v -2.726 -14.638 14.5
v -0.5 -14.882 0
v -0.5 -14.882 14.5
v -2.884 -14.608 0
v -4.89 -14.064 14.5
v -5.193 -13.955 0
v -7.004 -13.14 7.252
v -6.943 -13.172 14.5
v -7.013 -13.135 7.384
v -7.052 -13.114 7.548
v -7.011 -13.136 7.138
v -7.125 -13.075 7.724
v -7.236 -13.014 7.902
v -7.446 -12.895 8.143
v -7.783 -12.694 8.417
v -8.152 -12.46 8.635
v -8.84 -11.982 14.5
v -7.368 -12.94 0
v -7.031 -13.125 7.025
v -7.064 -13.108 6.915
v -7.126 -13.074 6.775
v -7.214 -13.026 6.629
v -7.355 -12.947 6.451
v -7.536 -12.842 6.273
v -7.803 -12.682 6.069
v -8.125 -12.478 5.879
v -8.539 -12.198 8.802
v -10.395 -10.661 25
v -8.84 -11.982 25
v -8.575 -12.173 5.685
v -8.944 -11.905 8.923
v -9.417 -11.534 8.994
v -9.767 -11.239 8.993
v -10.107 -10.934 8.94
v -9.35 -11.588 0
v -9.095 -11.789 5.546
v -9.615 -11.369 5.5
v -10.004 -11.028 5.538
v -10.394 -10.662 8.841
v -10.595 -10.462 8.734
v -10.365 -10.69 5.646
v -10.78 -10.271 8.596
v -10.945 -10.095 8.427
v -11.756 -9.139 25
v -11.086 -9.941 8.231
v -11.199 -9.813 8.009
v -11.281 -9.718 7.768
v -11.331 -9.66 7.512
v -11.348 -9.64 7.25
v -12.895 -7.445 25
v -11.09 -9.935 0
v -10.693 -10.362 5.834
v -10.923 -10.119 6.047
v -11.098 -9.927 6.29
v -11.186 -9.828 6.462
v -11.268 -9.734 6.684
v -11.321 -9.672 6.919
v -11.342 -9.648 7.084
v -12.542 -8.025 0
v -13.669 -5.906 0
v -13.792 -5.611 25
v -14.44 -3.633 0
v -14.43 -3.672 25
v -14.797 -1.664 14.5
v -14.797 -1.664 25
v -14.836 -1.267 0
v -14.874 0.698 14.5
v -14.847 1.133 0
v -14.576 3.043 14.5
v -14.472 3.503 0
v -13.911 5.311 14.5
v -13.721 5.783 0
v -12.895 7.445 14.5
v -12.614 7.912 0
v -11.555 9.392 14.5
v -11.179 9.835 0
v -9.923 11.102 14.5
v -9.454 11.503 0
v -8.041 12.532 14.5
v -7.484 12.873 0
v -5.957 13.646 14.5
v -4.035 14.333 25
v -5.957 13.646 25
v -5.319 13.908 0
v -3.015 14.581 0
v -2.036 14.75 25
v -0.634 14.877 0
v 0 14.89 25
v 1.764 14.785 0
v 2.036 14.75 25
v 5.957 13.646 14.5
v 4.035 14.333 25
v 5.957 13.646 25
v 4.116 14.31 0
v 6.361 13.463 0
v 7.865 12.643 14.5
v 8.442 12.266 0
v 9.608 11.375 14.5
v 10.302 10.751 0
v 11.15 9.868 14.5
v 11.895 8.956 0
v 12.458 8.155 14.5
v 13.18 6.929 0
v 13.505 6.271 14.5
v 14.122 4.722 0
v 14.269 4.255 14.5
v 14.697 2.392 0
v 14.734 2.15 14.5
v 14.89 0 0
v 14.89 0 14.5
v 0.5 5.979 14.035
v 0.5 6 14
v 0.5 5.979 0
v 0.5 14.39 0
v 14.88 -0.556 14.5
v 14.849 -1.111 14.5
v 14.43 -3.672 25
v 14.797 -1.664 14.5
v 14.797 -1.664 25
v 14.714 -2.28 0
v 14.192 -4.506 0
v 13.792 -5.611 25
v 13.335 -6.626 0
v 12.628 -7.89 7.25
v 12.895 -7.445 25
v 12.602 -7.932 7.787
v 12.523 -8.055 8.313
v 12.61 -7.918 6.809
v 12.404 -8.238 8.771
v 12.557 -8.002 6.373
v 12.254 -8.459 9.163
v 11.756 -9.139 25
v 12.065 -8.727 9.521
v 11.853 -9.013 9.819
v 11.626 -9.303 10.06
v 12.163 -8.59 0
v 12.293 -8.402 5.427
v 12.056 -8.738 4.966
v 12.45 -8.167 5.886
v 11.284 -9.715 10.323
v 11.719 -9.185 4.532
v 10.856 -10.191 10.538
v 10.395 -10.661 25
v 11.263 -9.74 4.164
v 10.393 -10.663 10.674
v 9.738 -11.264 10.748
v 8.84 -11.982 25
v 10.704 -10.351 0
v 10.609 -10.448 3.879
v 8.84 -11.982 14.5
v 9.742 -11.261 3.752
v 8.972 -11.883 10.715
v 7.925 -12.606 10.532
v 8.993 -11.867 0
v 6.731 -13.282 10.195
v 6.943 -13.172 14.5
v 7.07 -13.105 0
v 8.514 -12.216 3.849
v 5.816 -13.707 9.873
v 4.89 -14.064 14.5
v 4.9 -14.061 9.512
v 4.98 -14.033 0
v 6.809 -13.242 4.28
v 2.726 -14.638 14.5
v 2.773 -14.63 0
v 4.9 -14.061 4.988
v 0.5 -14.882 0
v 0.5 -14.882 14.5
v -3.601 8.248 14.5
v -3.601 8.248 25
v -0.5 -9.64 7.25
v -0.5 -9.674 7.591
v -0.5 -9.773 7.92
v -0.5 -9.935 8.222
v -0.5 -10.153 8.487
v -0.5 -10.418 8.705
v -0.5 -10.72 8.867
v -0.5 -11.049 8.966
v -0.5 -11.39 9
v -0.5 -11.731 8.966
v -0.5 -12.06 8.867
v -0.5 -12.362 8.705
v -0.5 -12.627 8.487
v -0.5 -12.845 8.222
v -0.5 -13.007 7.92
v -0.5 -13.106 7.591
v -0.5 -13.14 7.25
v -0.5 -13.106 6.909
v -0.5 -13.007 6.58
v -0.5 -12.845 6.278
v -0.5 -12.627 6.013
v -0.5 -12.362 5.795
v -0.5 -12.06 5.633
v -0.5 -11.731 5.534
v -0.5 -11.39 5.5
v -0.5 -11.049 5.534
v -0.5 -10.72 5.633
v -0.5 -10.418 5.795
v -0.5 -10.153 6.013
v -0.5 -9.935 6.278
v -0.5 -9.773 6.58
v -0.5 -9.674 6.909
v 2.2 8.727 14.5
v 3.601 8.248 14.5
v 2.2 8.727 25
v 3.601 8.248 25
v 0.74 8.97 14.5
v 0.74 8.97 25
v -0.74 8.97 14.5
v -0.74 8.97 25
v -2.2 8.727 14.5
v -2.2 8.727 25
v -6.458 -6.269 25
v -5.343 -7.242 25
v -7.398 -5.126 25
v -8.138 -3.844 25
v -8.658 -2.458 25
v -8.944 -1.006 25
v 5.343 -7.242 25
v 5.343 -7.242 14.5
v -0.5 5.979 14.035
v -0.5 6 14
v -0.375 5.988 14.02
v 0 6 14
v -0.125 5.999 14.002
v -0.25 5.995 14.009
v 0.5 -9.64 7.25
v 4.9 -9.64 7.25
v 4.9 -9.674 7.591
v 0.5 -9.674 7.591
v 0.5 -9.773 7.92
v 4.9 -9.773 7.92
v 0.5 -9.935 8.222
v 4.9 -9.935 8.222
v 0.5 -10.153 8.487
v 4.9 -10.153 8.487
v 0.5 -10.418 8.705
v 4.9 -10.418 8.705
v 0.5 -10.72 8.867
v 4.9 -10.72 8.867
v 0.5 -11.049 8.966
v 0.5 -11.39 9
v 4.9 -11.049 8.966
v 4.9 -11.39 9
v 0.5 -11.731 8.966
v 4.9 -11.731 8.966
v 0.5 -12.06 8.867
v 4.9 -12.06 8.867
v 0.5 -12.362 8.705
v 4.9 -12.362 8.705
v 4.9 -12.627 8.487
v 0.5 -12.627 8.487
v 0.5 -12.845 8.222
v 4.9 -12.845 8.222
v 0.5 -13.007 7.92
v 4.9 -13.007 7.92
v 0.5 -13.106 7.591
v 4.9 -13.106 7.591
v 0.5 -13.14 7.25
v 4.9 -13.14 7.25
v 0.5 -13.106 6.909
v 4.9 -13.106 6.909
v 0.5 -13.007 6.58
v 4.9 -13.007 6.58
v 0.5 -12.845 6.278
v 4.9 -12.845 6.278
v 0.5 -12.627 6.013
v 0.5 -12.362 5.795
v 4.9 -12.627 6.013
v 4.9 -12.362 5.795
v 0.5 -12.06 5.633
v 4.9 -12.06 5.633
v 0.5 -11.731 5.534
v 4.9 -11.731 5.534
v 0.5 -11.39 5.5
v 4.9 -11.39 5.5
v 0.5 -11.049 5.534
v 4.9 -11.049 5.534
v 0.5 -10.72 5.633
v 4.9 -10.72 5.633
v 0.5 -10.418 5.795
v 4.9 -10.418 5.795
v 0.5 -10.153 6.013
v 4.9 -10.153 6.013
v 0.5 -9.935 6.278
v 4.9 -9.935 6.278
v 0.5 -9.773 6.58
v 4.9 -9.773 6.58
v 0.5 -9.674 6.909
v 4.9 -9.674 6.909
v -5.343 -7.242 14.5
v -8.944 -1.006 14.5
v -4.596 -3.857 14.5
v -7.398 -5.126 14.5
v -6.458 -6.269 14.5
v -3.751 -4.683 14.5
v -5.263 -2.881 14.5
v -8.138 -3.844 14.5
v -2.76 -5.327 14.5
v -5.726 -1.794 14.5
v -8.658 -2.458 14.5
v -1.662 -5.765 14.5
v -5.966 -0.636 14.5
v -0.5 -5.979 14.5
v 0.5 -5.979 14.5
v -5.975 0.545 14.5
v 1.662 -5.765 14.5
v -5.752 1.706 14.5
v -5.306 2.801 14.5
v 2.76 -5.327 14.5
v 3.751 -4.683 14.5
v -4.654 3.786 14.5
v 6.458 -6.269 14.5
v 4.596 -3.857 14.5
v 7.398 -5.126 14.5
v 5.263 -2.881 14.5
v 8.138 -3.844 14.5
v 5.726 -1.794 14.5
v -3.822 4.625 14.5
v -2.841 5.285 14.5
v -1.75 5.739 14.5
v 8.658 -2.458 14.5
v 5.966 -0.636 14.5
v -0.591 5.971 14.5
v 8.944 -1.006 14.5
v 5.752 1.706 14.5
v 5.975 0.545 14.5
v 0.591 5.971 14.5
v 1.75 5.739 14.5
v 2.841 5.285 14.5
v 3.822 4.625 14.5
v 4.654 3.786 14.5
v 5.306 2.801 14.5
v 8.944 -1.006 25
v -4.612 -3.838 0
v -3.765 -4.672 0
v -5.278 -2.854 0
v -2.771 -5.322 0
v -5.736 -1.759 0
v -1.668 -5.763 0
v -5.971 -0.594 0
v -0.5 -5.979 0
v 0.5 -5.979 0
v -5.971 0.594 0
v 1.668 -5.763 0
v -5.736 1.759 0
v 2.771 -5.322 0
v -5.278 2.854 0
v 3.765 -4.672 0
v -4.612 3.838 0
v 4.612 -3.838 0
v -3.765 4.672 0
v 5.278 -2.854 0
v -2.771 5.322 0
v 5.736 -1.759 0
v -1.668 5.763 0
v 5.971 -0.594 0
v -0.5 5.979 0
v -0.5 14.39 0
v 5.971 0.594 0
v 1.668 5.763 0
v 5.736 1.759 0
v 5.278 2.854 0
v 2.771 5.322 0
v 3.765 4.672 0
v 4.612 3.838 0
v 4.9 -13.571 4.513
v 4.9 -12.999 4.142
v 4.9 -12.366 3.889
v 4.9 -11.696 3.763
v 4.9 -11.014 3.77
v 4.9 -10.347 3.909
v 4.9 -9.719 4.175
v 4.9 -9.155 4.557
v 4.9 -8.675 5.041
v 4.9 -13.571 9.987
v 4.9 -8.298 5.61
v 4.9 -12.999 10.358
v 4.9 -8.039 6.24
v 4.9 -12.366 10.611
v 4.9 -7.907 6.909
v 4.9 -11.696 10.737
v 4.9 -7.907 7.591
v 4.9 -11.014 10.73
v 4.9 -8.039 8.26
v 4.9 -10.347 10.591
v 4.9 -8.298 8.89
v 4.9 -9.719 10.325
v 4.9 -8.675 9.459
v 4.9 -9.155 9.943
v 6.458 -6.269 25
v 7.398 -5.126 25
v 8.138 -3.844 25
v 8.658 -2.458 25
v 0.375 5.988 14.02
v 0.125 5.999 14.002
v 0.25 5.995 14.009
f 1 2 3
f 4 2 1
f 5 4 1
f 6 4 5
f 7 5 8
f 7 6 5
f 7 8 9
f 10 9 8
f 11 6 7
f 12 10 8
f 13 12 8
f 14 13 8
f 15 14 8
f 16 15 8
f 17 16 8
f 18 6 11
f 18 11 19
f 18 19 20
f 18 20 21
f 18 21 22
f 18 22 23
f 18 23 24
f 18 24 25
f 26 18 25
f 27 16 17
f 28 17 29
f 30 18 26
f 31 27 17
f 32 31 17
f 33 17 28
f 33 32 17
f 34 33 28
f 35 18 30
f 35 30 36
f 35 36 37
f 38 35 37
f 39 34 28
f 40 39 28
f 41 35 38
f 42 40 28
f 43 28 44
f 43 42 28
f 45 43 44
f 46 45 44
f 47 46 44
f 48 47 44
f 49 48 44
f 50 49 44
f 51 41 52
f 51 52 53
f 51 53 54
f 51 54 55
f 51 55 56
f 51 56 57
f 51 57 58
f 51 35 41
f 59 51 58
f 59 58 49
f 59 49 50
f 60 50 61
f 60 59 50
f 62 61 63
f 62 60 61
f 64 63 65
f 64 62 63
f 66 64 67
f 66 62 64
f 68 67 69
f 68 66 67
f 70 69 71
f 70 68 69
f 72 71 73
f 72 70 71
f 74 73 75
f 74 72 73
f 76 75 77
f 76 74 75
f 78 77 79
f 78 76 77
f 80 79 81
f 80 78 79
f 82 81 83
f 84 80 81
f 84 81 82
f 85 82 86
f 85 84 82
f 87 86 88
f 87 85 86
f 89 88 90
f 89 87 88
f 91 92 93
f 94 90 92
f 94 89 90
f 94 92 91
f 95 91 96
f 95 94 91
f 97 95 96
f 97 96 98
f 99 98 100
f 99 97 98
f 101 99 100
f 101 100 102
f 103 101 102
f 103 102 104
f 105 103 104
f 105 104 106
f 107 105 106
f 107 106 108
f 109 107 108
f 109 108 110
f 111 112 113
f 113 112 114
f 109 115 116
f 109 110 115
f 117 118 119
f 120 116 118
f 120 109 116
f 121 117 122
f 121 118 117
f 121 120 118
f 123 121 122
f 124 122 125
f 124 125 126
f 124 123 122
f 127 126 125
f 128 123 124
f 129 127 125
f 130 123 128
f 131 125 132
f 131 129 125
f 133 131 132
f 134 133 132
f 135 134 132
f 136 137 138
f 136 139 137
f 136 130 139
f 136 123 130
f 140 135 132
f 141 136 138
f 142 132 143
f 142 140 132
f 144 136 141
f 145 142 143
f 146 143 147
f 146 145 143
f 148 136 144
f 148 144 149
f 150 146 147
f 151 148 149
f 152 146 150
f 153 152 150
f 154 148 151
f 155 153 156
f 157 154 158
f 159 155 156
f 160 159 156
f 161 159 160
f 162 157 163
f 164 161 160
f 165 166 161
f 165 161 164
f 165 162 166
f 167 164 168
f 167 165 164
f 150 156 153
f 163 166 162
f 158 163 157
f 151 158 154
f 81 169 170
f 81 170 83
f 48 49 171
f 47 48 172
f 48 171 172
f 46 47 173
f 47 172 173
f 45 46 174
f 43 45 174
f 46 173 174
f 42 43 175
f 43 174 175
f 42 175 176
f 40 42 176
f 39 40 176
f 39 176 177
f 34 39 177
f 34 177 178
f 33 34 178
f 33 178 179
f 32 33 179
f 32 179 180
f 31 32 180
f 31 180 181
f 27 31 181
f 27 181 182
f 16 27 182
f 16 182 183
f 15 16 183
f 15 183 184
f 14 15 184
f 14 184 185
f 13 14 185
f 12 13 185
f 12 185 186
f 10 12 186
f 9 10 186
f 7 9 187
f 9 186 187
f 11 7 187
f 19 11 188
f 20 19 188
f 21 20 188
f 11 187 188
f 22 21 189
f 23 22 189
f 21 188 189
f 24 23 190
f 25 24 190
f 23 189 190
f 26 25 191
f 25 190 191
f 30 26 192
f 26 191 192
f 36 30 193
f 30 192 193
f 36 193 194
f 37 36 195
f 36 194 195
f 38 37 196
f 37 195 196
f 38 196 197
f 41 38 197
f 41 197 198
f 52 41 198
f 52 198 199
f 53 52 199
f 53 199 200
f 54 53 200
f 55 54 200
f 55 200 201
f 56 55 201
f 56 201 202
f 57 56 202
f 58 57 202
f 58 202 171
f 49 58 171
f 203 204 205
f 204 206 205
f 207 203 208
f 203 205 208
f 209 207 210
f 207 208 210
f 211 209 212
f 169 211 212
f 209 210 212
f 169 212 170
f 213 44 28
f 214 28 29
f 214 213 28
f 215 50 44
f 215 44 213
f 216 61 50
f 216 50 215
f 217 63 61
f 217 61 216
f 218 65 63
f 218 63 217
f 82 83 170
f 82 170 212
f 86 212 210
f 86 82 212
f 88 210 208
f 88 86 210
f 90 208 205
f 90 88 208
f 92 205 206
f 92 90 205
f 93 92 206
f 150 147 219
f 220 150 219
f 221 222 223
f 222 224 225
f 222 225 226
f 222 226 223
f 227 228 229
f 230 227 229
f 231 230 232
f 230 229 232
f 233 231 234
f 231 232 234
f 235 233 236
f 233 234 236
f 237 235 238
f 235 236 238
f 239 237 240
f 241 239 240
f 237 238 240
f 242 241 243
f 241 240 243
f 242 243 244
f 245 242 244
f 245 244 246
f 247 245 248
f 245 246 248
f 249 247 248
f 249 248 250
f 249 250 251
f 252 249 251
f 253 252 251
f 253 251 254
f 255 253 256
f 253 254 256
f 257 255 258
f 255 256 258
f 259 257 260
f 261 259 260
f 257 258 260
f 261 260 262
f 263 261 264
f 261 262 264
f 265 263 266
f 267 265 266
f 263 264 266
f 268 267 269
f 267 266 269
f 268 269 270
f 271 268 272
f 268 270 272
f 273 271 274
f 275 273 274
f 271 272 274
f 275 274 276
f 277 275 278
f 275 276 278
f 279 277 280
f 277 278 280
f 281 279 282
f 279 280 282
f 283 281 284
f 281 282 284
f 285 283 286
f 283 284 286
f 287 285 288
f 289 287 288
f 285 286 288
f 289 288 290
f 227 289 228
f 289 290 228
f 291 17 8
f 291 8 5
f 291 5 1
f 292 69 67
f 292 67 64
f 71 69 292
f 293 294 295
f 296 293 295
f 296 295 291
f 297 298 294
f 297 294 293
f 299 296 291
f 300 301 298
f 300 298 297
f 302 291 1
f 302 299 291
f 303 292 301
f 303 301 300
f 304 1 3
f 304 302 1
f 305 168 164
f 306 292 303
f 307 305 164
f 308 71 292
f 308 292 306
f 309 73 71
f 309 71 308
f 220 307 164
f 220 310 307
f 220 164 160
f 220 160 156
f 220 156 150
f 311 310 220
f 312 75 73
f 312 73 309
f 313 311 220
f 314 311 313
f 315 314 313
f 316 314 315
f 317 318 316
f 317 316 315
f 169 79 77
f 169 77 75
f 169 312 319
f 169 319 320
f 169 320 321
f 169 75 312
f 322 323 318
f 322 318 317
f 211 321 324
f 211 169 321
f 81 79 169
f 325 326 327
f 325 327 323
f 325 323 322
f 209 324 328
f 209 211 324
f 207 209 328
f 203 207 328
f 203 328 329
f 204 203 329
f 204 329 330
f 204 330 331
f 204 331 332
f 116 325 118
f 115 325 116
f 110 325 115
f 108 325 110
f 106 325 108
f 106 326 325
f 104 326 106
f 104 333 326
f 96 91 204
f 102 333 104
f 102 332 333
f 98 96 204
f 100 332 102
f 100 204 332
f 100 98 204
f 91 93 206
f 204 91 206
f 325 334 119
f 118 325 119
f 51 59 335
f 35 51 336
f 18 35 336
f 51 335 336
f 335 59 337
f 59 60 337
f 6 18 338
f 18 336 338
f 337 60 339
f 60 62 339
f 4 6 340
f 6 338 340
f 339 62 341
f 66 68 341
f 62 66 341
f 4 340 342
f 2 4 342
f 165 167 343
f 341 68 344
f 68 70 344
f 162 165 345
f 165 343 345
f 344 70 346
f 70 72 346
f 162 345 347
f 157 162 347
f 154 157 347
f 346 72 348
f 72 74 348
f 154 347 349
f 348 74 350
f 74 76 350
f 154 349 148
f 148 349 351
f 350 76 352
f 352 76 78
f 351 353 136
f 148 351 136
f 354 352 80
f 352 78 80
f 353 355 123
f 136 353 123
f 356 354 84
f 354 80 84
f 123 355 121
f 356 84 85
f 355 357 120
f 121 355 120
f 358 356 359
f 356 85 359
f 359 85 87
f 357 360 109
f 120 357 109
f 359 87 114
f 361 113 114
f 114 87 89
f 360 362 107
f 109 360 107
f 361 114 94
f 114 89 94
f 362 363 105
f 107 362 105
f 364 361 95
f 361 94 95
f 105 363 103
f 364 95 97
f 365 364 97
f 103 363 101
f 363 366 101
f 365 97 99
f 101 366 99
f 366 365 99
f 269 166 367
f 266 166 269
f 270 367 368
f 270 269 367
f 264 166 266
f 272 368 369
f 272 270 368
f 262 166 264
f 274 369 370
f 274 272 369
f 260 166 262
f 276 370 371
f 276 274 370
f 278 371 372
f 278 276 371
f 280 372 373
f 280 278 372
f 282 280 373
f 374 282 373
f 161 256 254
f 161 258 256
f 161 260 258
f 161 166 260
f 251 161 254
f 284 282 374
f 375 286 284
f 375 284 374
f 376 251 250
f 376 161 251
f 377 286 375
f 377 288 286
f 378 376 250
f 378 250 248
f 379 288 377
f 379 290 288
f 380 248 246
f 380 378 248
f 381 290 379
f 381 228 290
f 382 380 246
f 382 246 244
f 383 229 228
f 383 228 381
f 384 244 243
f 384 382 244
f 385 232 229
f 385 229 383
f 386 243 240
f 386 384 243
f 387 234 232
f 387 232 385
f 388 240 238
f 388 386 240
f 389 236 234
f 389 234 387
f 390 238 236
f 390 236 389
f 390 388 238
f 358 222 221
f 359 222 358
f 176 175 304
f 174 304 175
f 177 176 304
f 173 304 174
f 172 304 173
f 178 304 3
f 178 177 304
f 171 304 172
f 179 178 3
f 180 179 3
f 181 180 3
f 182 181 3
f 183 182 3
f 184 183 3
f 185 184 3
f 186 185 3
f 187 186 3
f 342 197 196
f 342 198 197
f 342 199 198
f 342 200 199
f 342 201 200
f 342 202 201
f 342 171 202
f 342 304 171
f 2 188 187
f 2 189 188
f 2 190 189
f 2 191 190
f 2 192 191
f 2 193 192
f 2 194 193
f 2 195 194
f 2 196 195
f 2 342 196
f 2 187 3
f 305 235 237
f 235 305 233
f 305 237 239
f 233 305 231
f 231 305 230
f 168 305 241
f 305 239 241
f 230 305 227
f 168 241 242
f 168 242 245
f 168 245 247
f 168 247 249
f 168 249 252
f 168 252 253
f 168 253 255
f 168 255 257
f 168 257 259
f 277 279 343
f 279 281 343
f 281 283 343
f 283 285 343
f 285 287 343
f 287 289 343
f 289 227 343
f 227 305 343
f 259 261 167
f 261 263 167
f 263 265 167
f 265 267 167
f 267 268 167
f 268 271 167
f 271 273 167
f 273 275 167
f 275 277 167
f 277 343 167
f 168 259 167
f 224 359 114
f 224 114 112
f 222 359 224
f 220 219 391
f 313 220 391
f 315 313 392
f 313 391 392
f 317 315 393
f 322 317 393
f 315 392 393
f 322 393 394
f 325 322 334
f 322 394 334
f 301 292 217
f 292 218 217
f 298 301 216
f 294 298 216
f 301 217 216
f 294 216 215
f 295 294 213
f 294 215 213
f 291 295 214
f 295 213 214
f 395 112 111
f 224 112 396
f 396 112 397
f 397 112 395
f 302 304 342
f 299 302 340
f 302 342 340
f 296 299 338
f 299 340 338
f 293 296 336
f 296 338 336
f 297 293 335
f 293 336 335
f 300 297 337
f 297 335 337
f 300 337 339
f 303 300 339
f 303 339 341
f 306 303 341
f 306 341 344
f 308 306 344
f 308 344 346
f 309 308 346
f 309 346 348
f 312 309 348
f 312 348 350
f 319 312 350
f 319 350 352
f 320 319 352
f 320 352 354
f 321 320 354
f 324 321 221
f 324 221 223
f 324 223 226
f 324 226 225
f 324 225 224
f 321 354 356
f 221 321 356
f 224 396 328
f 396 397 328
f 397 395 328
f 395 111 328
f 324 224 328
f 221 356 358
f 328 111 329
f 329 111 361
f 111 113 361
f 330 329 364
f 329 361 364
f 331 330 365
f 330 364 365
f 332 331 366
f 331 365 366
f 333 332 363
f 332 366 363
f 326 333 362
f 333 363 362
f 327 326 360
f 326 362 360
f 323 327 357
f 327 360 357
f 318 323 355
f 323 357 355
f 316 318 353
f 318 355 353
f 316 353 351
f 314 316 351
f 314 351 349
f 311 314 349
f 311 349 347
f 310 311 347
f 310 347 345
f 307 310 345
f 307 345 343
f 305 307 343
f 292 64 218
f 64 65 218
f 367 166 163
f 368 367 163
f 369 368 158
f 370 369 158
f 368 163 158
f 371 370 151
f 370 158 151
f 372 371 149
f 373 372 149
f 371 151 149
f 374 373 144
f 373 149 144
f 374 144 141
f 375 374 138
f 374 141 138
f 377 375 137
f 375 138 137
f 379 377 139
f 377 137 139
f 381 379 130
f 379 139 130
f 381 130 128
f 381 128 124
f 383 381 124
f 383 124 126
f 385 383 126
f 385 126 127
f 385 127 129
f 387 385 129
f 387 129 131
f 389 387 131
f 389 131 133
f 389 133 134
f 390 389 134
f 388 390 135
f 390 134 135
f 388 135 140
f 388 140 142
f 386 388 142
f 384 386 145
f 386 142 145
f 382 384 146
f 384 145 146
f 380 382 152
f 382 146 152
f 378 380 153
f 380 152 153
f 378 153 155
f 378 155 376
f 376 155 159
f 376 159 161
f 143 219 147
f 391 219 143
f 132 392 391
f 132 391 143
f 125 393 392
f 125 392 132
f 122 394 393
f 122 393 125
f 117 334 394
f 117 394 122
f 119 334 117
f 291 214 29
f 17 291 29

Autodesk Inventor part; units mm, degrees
ref_plane "XZ Plane" through (0, 0, 0) normal (0, 1, 0) x (-1, 0, 0)
ref_plane "XY Plane" through (0, 0, 0) normal (0, 0, 1) x (1, 0, 0)
sketch "Sketch1" plane through (0, 0, 0) normal (0, 0, 1) x (1, 0, 0)
  circle A0 centre (0, 0) radius 14.89
  circle A1 centre (0, 0) radius 6
  circle A2 centre (0, 0) radius 3.175
  dimension "d0" = 29.78
  dimension "d1" = 12
  dimension "d41" = 6.35
extrude "Extrusion1" add sketch "Sketch1" along normal blind 25 contours A0
sketch "Sketch2" plane through (0, 0, 25) normal (0, 0, 1) x (1, 0, 0)
  circle A0 centre (0, 0) radius 14.89 projected
  circle A1 centre (0, 0) radius 9
  circle A2 centre (0, 0) radius 14.89 projected
  line L0 (-3.6007, 8.2483) -> (-5.9571, 13.6464)
  line L1 (5.9571, 13.6464) -> (3.6007, 8.2483)
  line L2 (-5.3429, -7.2425) -> (-8.8396, -11.9822)
  line L3 (-14.7967, -1.6642) -> (-8.9436, -1.0059)
  line L4 (8.9436, -1.0059) -> (14.7967, -1.6642)
  line L5 (8.8396, -11.9822) -> (5.3429, -7.2425)
  dimension "d14" = 18
  dimension "d24" = 360
extrude "Extrusion2" cut sketch "Sketch2" against normal blind 10.5 contours A0 L4 A1 L1 | L0 A1 L3 A0 | A1 | A0 L2 A1 L5
ref_plane "Work Plane1" through (14.9, 0, 0) normal (1, 0, 0) x (0, 1, 0)
sketch "Sketch3" plane through (14.9, 0, 0) normal (1, 0, 0) x (0, 1, 0)
  line L0 (-1.6642, 14.5) -> (-1.6642, 25) projected
  line L1 (-11.9822, 25) -> (-1.6642, 25) projected
  line L2 (-11.9822, 25) -> (-11.9822, 14.5) projected
  line L3 (-11.9822, 14.5) -> (-11.9822, 14.5) projected
  line L4 (-11.9822, 14.5) -> (-11.9822, 25) projected
  line L5 (-1.6642, 25) -> (-11.9822, 25) projected
  line L6 (-1.6642, 25) -> (-1.6642, 14.5) projected
  line L7 (-1.6642, 14.5) -> (13.6464, 14.5) projected
  line L8 (13.6464, 14.5) -> (13.6464, 25) projected
  line L9 (13.6464, 25) -> (13.6464, 25) projected
  line L10 (13.6464, 25) -> (13.6464, 14.5) projected
  line L11 (13.6464, 14.5) -> (-1.6642, 14.5) projected
  line L12 (14.89, 0) -> (-14.89, 0) projected
  line L13 (14.89, 25) -> (13.6464, 25) projected
  line L14 (14.89, 25) -> (14.89, 0)
  line L15 (14.89, 0) -> (14.89, 25) projected
  line L16 (-14.89, 0) -> (-14.89, 14.5) projected
  line L17 (14.89, 0) -> (-14.89, 0) projected
  line L18 (-14.89, 14.5) -> (-14.89, 0)
  line L19 (-7.89, 0) -> (-14.89, 0)
  line L20 (-14.89, 0) -> (-14.89, 14.5)
  line L21 (-14.89, 7.25) -> (-7.89, 7.25)
  circle A0 centre (-11.39, 7.25) radius 3.5
  circle A1 centre (-11.39, 7.25) radius 1.75
  point P0 (0, 0)
  dimension "d27" = 29.78
  dimension "d30" = 3.5
extrude "Extrusion3" cut sketch "Sketch3" against normal blind 10
extrude "Extrusion4" cut sketch "Sketch3" against normal blind 30 contours A1 L21 | L21 A1
sketch "Sketch4" plane through (0, 0, 0) normal (0, 0, -1) x (-1, 0, 0)
  arc A0 (-8.8396, -11.9822) -> (8.8396, -11.9822) centre (0, 0) ccw projected
  line L0 (0, 0) -> (-0.5, 0)
  line L1 (-0.5, 0) -> (-0.5, -14.8816)
  line L2 (0, 0) -> (0.5, 0)
  line L3 (0.5, 0) -> (0.5, -14.8816)
  line L4 (-0.5, 0) -> (-0.5, 14.8816)
  line L5 (0.5, 0) -> (0.5, 14.8816)
  arc A1 (5.3429, -7.2425) -> (8.9436, -1.0059) centre (0, 0) ccw projected
  circle A2 centre (0, 0) radius 14.89 projected
  point P0 (-8.8396, 11.9822)
  dimension "d33" = 0.5
  dimension "d34" = 0.5
extrude "Extrusion5" cut sketch "Sketch4" against normal blind 15 contours L1 L0 L2 L3 A0
sketch "Sketch5" plane through (-0.5, -14.8816, 0) normal (1, 0, 0) x (0, 0, -1)
  line L0 (0, 0) -> (-14.5, 0) projected
  line L1 (-14.5, 0) -> (-14.5, 2.8994) projected
  line L2 (-14.5, 2.8994) -> (-25, 2.8994) projected
  line L3 (-25, 13.2174) -> (-25, 2.8994) projected
  line L4 (-25, 13.2174) -> (-14.5, 13.2174) projected
  line L5 (-14.5, 13.2174) -> (-14.5, 28.528) projected
  line L6 (-14.5, 28.528) -> (-25, 28.528) projected
  line L7 (-25, 28.528) -> (-25, 28.528) projected
  line L8 (-25, 28.528) -> (-14.5, 28.528) projected
  line L9 (-14.5, 28.528) -> (-14.5, 13.2174) projected
  line L10 (-14.5, 13.2174) -> (-25, 13.2174) projected
  line L11 (-25, 2.8994) -> (-25, 13.2174) projected
  line L12 (-25, 2.8994) -> (-14.5, 2.8994) projected
  line L13 (-14.5, 2.8994) -> (-14.5, 0) projected
  line L14 (-14.5, 0) -> (0, 0) projected
  line L15 (0, 0) -> (0, 0) projected
  line L16 (-4.9878, 0.8209) -> (-9.5122, 0.8209) projected
  line L17 (-14.5, 8.9025) -> (0, 8.9025) projected
  line L18 (0, 8.9025) -> (0, 8.9025) projected
  line L19 (0, 8.9025) -> (-14.5, 8.9025) projected
  line L20 (-14.5, 8.9025) -> (-14.5, 8.9025) projected
  line L21 (-14.5, 20.8816) -> (-14.5, 8.9025) projected
  line L22 (-14.5, 20.8816) -> (0, 20.8816)
  line L23 (0, 29.7716) -> (0, 0) projected
  line L24 (-14.5, 20.8816) -> (-14, 20.8816)
  line L25 (0, 29.7716) -> (0, 29.2716)
  line L26 (0, 29.2716) -> (-14, 20.8816)
  line L27 (-14.5, 20.8585) -> (0, 20.8585)
  line L28 (0, 8.9025) -> (0, 20.8816) projected
  line L29 (-14, 20.8816) -> (-14.0385, 20.8585)
  line L30 (-14.5, 18.0566) -> (0, 18.0566) projected
  line L31 (-14.5, 18.0566) -> (-14.5, 11.7462) projected
  line L32 (-14.5, 18.0145) -> (0, 18.0145)
  line L33 (-14.5, 18.0145) -> (-14, 18.0145)
  line L34 (-14, 18.0145) -> (0, 29.2716)
  point P0 (0, 14.8816)
  point P1 (-7.25, 1.7416)
  point P2 (-13.9476, 18.0566)
  dimension "d37" = 0.5
  dimension "d38" = 0.5
  dimension "d42" = 0.5
extrude "Extrusion6" cut sketch "Sketch5" along normal blind 1 contours L32 L34 L30 L23 | L30 L34 L27 L23 | L32 L5 L30 L34 | L27 L34 L22 L23 | L30 L5 L27 L34 | L22 L34 L23 | L27 L29 L22 L34 | L22 L26 L34
properties part number "PHAN NHOM"
